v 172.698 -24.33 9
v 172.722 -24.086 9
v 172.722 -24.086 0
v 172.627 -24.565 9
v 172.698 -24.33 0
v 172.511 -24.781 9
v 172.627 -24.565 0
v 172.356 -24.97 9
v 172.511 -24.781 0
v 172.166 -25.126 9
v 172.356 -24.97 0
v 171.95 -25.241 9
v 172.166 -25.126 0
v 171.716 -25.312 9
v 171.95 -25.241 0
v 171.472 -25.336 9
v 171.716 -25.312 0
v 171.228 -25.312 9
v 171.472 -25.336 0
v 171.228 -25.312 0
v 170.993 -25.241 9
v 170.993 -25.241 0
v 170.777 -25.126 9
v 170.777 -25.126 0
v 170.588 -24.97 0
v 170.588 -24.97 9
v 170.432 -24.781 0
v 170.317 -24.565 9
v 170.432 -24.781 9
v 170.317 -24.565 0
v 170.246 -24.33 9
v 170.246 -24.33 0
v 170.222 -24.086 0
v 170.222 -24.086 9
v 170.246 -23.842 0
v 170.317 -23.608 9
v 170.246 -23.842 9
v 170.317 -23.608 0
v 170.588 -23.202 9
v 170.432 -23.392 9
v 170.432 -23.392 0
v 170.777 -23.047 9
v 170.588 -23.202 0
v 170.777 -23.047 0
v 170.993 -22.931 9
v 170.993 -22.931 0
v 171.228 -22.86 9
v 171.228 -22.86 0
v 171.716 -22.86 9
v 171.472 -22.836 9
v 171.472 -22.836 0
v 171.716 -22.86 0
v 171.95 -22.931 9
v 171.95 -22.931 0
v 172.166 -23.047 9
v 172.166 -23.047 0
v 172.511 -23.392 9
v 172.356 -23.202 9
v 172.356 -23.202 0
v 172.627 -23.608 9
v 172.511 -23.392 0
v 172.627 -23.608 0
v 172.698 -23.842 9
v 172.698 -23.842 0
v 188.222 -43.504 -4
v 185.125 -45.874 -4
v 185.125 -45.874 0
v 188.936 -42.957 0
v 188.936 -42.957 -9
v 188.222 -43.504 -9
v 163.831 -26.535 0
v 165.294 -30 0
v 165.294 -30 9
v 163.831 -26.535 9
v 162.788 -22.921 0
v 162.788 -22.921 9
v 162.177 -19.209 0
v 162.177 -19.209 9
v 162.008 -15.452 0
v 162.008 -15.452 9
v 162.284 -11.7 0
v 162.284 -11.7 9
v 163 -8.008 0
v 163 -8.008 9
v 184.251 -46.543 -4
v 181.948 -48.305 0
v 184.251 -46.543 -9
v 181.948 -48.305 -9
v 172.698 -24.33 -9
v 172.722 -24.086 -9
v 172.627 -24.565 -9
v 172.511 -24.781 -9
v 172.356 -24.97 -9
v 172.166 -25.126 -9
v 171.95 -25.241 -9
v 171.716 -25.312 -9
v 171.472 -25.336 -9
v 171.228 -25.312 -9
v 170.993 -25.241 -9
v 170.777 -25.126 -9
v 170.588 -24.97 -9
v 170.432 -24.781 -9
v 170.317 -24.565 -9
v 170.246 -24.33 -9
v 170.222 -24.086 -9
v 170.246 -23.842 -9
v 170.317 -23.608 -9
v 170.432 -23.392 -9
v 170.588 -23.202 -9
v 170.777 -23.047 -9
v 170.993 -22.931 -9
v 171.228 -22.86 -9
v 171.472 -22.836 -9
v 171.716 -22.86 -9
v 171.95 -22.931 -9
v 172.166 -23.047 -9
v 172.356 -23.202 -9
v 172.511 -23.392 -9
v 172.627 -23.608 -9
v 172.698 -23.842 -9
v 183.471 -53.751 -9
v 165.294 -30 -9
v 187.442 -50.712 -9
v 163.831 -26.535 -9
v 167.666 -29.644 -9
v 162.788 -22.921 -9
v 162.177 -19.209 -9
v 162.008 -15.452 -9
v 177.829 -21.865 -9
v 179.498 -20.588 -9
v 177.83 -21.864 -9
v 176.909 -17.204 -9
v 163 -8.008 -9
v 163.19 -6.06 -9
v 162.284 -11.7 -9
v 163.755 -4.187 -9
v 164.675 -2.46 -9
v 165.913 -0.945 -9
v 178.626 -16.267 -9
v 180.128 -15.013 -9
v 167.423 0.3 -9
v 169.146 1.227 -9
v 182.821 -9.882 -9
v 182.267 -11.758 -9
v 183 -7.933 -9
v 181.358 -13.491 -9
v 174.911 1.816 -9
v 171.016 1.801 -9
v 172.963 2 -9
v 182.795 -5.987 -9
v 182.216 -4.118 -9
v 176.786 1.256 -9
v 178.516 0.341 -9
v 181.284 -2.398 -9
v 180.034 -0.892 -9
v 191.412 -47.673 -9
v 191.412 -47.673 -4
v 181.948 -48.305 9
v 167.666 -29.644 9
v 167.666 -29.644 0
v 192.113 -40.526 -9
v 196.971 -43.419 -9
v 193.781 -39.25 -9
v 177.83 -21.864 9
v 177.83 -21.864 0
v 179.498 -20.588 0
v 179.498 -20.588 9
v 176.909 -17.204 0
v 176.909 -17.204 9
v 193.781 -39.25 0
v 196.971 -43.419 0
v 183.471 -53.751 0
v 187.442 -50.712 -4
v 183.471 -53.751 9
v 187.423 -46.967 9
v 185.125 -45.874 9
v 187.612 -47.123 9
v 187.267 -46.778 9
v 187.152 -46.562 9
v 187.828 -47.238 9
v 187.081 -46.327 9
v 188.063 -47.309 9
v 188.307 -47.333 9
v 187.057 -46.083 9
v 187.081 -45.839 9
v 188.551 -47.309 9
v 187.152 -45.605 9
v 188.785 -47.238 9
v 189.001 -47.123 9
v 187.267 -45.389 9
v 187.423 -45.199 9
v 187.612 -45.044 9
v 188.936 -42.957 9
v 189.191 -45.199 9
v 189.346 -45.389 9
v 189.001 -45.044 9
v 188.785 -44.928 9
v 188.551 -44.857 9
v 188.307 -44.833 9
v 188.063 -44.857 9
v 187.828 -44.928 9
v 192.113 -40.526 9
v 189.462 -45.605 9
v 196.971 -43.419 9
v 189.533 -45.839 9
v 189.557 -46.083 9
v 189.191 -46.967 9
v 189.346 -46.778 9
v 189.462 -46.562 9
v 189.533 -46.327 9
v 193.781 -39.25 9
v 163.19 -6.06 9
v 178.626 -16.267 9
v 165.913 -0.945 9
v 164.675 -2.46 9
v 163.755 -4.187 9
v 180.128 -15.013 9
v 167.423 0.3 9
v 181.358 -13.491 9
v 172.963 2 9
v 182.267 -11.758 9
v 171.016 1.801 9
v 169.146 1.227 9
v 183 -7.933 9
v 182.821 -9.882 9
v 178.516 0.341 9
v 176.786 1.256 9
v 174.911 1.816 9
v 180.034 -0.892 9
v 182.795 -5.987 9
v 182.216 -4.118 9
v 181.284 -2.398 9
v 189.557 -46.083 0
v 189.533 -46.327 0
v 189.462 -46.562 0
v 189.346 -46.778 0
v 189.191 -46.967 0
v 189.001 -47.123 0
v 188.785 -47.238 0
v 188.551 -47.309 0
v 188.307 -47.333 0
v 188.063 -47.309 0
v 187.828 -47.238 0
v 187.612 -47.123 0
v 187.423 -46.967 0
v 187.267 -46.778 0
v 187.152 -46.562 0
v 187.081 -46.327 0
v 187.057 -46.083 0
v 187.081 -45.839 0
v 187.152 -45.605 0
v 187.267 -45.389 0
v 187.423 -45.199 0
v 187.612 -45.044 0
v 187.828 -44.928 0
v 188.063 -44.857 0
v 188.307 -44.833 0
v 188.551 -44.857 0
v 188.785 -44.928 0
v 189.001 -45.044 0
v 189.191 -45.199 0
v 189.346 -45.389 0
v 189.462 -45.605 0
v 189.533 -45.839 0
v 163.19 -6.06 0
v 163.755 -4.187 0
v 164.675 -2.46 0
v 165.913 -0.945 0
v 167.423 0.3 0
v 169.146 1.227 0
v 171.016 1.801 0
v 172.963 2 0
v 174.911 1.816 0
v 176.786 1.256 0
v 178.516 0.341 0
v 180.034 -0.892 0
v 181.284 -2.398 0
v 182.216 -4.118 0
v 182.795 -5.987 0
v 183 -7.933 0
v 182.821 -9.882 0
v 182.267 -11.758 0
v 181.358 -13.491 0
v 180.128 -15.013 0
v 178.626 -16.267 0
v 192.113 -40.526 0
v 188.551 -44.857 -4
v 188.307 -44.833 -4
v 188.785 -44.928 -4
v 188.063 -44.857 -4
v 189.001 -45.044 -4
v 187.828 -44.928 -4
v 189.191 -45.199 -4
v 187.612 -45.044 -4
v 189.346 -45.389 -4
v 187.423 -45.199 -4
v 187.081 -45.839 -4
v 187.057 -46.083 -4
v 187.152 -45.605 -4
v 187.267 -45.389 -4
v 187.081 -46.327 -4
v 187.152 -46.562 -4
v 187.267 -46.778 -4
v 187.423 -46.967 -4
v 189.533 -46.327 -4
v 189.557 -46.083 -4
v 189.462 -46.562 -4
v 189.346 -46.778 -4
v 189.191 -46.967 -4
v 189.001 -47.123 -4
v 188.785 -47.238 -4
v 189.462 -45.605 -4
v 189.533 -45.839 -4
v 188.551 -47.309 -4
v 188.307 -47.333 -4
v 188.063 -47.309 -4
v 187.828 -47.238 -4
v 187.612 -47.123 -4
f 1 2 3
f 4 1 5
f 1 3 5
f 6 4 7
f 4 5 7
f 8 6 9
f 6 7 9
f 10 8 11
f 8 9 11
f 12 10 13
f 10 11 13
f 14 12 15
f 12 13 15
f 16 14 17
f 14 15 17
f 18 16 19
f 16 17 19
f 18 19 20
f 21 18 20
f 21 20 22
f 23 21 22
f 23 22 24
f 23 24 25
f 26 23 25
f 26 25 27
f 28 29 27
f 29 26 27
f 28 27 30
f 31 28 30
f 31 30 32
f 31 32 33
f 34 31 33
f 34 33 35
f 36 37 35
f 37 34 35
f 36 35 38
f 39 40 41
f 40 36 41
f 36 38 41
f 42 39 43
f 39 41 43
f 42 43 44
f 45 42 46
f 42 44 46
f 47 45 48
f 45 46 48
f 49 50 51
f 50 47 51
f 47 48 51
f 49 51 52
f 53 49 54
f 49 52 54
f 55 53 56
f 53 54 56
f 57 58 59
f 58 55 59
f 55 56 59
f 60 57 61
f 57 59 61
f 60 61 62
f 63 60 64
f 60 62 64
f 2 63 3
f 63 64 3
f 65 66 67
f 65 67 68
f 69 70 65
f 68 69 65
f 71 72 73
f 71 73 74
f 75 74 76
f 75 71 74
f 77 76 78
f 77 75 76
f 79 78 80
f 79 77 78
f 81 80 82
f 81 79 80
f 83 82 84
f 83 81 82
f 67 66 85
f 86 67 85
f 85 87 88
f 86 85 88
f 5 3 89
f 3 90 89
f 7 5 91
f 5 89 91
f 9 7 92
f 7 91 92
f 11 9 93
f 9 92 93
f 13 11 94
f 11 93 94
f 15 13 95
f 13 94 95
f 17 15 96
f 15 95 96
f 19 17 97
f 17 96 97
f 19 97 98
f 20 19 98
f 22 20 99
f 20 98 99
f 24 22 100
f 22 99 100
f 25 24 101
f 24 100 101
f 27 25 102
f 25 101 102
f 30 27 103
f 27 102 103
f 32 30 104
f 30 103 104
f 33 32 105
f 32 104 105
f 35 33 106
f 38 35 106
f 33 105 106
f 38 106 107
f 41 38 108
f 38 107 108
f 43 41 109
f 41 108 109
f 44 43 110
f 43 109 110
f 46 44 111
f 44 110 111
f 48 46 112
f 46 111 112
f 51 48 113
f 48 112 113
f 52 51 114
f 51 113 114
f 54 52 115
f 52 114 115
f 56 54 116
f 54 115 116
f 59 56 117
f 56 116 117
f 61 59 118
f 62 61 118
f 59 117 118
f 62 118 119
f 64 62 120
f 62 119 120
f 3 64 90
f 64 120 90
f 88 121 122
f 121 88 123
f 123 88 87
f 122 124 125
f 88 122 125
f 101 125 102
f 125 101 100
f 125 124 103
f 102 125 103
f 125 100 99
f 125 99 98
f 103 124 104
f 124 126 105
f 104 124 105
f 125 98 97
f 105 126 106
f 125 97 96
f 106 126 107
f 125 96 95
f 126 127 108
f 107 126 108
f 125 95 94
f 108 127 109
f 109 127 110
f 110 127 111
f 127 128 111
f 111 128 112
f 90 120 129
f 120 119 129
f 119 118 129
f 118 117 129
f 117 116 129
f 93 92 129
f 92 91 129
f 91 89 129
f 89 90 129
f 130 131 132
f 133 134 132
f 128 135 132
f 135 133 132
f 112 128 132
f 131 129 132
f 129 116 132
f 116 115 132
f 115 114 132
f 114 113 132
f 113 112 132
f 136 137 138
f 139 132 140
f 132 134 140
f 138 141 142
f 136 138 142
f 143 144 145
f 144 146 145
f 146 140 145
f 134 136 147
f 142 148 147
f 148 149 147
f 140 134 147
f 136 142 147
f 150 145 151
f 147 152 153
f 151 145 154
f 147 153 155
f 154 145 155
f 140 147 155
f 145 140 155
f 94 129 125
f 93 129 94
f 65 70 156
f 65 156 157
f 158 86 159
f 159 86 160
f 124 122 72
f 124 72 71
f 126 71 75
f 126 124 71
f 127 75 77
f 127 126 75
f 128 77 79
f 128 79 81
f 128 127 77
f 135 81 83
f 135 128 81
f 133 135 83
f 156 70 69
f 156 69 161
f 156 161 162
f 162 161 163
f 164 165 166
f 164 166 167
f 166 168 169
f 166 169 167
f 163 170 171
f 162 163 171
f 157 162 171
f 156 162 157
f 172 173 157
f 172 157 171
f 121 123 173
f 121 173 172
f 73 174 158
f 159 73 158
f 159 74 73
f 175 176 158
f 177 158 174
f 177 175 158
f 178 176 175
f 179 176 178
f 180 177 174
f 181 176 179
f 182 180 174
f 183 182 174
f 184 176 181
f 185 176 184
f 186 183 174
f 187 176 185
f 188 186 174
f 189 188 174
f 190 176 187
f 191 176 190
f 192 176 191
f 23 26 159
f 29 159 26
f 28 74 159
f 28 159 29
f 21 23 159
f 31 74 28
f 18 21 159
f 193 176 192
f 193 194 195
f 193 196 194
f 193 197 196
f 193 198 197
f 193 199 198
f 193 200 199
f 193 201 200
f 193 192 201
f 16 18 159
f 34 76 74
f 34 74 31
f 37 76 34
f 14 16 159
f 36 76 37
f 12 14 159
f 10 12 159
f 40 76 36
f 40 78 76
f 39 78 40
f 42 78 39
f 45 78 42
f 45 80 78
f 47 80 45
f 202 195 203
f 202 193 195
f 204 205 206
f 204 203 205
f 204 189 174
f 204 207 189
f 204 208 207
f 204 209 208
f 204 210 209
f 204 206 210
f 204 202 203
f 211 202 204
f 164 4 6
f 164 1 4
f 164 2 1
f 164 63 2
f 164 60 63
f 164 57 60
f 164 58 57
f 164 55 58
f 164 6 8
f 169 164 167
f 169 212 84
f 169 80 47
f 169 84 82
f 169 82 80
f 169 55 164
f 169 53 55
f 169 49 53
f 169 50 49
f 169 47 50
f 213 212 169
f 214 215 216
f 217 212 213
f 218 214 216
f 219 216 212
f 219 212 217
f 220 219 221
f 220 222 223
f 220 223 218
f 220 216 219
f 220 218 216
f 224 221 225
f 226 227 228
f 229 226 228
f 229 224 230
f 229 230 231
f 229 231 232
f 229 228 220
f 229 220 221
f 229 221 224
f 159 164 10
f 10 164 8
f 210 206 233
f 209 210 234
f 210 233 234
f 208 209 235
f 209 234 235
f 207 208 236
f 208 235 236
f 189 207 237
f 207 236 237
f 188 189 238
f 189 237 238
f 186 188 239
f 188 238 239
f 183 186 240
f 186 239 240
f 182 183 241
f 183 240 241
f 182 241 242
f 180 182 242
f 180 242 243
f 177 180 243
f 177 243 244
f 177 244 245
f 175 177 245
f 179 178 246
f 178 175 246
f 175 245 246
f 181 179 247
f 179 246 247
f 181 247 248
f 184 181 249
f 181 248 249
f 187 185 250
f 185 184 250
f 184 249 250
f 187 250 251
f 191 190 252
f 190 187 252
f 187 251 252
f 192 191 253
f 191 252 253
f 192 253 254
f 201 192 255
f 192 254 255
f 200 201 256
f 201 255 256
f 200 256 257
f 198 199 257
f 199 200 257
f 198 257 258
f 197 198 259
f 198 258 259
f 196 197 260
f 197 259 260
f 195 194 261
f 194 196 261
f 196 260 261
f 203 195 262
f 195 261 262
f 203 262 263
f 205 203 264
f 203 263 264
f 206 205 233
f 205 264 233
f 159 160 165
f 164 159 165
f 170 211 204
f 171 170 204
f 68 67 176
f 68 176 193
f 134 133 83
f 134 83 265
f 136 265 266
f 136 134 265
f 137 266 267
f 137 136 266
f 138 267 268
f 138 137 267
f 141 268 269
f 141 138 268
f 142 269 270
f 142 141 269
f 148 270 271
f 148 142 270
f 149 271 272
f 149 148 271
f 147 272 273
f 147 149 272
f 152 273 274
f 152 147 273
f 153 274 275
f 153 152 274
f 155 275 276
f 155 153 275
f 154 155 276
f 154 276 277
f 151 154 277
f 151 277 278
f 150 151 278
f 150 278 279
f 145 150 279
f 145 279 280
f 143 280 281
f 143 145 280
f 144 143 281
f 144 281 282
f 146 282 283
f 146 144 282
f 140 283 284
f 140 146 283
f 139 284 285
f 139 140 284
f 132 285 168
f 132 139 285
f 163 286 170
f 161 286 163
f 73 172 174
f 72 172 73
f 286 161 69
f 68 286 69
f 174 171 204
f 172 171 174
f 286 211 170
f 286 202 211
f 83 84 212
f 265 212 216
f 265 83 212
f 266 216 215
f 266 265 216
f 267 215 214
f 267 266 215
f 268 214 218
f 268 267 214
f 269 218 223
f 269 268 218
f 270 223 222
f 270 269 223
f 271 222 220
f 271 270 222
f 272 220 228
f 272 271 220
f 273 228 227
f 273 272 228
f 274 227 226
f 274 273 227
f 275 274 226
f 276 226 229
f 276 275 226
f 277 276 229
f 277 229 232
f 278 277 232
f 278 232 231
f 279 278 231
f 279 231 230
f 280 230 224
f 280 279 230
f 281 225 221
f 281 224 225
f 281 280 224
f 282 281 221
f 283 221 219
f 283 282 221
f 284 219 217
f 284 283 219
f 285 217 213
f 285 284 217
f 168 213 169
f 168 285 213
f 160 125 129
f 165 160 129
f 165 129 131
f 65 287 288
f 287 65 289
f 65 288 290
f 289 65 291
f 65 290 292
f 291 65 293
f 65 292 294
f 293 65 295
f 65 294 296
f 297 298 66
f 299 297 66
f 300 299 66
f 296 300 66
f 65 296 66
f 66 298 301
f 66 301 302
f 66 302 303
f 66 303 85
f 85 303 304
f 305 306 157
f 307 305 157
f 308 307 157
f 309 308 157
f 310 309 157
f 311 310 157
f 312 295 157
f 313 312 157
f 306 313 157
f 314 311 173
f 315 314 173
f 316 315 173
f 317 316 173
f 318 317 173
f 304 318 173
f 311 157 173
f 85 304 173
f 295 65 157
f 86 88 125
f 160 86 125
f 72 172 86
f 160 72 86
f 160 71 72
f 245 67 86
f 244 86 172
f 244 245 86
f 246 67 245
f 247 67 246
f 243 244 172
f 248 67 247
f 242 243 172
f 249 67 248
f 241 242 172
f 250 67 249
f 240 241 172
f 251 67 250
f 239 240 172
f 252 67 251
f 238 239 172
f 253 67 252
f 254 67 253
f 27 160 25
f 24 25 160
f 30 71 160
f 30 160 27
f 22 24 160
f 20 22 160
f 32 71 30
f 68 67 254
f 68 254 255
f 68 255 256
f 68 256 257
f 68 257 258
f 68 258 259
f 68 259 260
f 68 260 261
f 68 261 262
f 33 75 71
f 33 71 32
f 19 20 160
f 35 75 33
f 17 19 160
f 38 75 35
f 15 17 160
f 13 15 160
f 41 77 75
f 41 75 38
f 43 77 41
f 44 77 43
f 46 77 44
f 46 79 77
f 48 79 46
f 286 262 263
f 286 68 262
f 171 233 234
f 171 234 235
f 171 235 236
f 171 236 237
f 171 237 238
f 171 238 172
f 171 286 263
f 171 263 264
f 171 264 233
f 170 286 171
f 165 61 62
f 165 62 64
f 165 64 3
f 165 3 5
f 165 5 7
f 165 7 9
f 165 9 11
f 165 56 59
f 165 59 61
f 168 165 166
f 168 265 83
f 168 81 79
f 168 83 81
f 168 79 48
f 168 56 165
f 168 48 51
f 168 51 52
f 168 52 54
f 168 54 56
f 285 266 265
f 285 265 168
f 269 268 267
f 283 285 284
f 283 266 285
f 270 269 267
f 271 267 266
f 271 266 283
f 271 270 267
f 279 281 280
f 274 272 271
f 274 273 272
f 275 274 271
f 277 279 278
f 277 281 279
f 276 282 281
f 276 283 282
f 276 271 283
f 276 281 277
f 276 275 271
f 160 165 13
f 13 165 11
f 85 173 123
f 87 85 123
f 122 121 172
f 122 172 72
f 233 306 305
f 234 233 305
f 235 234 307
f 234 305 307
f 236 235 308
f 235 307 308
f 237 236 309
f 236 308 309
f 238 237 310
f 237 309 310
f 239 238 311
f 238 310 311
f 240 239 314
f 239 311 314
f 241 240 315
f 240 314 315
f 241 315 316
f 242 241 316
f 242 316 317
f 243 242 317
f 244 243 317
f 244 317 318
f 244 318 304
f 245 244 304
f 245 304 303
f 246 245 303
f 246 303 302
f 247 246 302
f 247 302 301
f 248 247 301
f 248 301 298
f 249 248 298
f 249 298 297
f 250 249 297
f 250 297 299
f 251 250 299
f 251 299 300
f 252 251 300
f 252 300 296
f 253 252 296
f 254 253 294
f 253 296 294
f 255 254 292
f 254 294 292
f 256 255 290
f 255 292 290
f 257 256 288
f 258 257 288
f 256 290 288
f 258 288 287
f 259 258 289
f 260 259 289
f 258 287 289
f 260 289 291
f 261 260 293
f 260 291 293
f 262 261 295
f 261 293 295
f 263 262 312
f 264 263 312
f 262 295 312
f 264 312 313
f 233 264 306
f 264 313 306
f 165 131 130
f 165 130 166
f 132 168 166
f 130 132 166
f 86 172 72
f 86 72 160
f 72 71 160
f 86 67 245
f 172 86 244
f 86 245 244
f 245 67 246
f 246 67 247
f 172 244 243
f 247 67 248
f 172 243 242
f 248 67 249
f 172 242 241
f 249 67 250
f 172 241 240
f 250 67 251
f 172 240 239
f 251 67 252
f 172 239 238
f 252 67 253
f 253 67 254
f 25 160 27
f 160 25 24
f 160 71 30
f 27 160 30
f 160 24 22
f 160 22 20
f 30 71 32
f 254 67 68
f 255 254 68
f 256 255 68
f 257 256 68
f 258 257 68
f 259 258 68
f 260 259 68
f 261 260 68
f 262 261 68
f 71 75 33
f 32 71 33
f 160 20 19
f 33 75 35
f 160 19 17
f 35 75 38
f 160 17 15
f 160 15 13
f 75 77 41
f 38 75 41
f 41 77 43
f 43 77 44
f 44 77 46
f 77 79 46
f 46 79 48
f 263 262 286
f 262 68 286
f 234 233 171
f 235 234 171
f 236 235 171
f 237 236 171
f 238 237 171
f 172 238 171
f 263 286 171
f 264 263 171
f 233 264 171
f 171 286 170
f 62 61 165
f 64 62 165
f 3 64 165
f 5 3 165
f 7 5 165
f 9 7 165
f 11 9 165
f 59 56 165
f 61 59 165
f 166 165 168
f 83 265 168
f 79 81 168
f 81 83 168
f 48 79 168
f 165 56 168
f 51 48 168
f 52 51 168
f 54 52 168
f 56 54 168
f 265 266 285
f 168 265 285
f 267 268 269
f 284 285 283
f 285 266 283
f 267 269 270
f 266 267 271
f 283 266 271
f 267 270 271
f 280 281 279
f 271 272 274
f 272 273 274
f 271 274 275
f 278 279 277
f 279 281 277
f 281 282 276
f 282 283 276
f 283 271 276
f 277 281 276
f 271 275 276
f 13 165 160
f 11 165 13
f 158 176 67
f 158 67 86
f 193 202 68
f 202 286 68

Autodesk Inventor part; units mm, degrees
ref_plane "YZ Plane" through (0, 0, 0) normal (1, 0, 0) x (0, 1, 0)
ref_plane "XZ Plane" through (0, 0, 0) normal (0, 1, 0) x (-1, 0, 0)
ref_plane "XY Plane" through (0, 0, 0) normal (0, 0, 1) x (1, 0, 0)
sketch "스케치2" plane through (0, 0, 0) normal (0, 0, 1) x (1, 0, 0)
  line L0 (168.2265, -29.7181) -> (182.0227, -47.7445)
  line L1 (191.5521, -40.4514) -> (177.7559, -22.4249)
  line L2 (177.7559, -22.4249) -> (168.2265, -29.7181)
  line L3 (172.1391, -30.8815) -> (212.5451, -83.6769) projected
  line L4 (175.1246, -38.7313) -> (184.654, -31.4381) construction
  line L5 (172.9912, -26.0715) -> (186.7874, -44.098) construction
  line L6 (185.1992, -45.3135) -> (187.5087, -48.3311)
  line L7 (187.5087, -48.3311) -> (190.6852, -45.9001)
  line L8 (190.6852, -45.9001) -> (188.3757, -42.8824)
  line L9 (176.3073, -16.4187) -> (196.9713, -43.4187)
  line L10 (196.9713, -43.4187) -> (183.4713, -53.7507)
  line L11 (183.4713, -53.7507) -> (162.8073, -26.7507)
  line L12 (162.8073, -26.7507) -> (176.3073, -16.4187)
  line L13 (176.3073, -16.4187) -> (183.4713, -53.7507) construction
  line L14 (196.9713, -43.4187) -> (162.8073, -26.7507) construction
  line L15 (182.0227, -47.7445) -> (185.1992, -45.3135)
  line L16 (188.3757, -42.8824) -> (191.5521, -40.4514)
  line L17 (177.8304, -21.8642) -> (192.1129, -40.5259)
  line L18 (192.1129, -40.5259) -> (188.9364, -42.957)
  line L19 (188.9364, -42.957) -> (191.2459, -45.9746)
  line L20 (191.2459, -45.9746) -> (187.4341, -48.8919)
  line L21 (187.4341, -48.8919) -> (185.1246, -45.8742)
  line L22 (185.1246, -45.8742) -> (181.9482, -48.3053)
  line L23 (181.9482, -48.3053) -> (167.6657, -29.6435)
  line L24 (167.6657, -29.6435) -> (177.8304, -21.8642)
  circle A0 centre (173, -8) radius 10 projected
  line L25 (185.1246, -45.8742) -> (188.9364, -42.957)
  circle A1 centre (171.4718, -24.0862) radius 1.25
  circle A2 centre (188.3068, -46.0833) radius 1.25
  arc A3 (163, -8.0077) -> (165.2941, -30) centre (193.8521, -15.9052) ccw
  point P0 (0, 0)
  point P1 (179.8893, -35.0847)
  point P2 (179.8893, -35.0847)
  point P3 (176.9087, -17.2045)
  point P4 (174.3632, -17.9067)
  point P5 (163.6763, -26.0857)
  dimension "d0" = 22.7
  dimension "d1" = 12
  dimension "d2" = 4
  dimension "d3" = 26.5
  dimension "d4" = 34
  dimension "d5" = 17
  dimension "d6" = 0.4
  dimension "d9" = 2.5
  dimension "d10" = 2.5
  dimension "d16" = 3.6
extrude "돌출1" add sketch "스케치2" along normal mid plane 18 contours L25 L6 L7 L8 L19 L20 L21 | L25 L8 L7 L6 | L12 A0 L9 | L9 A0 L12 | L9 L10 L11 A3 L12 A0 | L12 A3 A0
sketch "스케치3" plane through (192.1129, -40.5259, -9) normal (-0.7941176, -0.6077641, 0) x (0, 0, 1)
  line L0 (18, 0) -> (0, 0) projected
  line L1 (18, 23.5) -> (18, 0) projected
  line L2 (0, 23.5) -> (18, 23.5) projected
  line L3 (0, 0) -> (0, 23.5) projected
  point P0 (9, 148.9416)
extrude "돌출2" cut sketch "스케치3" against normal blind 18
sketch "스케치4" plane through (196.9713, -43.4187, -9) normal (0.6077641, -0.7941176, 0) x (0.7941176, 0.6077641, 0)
  line L0 (0, 0) -> (-17, 0) projected
  line L1 (-12, 0) -> (-7, 0)
  line L2 (-7, 0) -> (-7, 5)
  line L3 (-7, 5) -> (-12, 5)
  line L4 (-12, 5) -> (-12, 0)
  point P0 (-130.03, 9)
  point P1 (-7, 0)
extrude "돌출3" cut sketch "스케치4" against normal blind 18
split body "분할1" result two bodies by plane through (0, 0, 0) normal (0, 0, 1) first body at (174.2785, -9.3972, 8.5)
properties part number "SAFRS-P-0021"
